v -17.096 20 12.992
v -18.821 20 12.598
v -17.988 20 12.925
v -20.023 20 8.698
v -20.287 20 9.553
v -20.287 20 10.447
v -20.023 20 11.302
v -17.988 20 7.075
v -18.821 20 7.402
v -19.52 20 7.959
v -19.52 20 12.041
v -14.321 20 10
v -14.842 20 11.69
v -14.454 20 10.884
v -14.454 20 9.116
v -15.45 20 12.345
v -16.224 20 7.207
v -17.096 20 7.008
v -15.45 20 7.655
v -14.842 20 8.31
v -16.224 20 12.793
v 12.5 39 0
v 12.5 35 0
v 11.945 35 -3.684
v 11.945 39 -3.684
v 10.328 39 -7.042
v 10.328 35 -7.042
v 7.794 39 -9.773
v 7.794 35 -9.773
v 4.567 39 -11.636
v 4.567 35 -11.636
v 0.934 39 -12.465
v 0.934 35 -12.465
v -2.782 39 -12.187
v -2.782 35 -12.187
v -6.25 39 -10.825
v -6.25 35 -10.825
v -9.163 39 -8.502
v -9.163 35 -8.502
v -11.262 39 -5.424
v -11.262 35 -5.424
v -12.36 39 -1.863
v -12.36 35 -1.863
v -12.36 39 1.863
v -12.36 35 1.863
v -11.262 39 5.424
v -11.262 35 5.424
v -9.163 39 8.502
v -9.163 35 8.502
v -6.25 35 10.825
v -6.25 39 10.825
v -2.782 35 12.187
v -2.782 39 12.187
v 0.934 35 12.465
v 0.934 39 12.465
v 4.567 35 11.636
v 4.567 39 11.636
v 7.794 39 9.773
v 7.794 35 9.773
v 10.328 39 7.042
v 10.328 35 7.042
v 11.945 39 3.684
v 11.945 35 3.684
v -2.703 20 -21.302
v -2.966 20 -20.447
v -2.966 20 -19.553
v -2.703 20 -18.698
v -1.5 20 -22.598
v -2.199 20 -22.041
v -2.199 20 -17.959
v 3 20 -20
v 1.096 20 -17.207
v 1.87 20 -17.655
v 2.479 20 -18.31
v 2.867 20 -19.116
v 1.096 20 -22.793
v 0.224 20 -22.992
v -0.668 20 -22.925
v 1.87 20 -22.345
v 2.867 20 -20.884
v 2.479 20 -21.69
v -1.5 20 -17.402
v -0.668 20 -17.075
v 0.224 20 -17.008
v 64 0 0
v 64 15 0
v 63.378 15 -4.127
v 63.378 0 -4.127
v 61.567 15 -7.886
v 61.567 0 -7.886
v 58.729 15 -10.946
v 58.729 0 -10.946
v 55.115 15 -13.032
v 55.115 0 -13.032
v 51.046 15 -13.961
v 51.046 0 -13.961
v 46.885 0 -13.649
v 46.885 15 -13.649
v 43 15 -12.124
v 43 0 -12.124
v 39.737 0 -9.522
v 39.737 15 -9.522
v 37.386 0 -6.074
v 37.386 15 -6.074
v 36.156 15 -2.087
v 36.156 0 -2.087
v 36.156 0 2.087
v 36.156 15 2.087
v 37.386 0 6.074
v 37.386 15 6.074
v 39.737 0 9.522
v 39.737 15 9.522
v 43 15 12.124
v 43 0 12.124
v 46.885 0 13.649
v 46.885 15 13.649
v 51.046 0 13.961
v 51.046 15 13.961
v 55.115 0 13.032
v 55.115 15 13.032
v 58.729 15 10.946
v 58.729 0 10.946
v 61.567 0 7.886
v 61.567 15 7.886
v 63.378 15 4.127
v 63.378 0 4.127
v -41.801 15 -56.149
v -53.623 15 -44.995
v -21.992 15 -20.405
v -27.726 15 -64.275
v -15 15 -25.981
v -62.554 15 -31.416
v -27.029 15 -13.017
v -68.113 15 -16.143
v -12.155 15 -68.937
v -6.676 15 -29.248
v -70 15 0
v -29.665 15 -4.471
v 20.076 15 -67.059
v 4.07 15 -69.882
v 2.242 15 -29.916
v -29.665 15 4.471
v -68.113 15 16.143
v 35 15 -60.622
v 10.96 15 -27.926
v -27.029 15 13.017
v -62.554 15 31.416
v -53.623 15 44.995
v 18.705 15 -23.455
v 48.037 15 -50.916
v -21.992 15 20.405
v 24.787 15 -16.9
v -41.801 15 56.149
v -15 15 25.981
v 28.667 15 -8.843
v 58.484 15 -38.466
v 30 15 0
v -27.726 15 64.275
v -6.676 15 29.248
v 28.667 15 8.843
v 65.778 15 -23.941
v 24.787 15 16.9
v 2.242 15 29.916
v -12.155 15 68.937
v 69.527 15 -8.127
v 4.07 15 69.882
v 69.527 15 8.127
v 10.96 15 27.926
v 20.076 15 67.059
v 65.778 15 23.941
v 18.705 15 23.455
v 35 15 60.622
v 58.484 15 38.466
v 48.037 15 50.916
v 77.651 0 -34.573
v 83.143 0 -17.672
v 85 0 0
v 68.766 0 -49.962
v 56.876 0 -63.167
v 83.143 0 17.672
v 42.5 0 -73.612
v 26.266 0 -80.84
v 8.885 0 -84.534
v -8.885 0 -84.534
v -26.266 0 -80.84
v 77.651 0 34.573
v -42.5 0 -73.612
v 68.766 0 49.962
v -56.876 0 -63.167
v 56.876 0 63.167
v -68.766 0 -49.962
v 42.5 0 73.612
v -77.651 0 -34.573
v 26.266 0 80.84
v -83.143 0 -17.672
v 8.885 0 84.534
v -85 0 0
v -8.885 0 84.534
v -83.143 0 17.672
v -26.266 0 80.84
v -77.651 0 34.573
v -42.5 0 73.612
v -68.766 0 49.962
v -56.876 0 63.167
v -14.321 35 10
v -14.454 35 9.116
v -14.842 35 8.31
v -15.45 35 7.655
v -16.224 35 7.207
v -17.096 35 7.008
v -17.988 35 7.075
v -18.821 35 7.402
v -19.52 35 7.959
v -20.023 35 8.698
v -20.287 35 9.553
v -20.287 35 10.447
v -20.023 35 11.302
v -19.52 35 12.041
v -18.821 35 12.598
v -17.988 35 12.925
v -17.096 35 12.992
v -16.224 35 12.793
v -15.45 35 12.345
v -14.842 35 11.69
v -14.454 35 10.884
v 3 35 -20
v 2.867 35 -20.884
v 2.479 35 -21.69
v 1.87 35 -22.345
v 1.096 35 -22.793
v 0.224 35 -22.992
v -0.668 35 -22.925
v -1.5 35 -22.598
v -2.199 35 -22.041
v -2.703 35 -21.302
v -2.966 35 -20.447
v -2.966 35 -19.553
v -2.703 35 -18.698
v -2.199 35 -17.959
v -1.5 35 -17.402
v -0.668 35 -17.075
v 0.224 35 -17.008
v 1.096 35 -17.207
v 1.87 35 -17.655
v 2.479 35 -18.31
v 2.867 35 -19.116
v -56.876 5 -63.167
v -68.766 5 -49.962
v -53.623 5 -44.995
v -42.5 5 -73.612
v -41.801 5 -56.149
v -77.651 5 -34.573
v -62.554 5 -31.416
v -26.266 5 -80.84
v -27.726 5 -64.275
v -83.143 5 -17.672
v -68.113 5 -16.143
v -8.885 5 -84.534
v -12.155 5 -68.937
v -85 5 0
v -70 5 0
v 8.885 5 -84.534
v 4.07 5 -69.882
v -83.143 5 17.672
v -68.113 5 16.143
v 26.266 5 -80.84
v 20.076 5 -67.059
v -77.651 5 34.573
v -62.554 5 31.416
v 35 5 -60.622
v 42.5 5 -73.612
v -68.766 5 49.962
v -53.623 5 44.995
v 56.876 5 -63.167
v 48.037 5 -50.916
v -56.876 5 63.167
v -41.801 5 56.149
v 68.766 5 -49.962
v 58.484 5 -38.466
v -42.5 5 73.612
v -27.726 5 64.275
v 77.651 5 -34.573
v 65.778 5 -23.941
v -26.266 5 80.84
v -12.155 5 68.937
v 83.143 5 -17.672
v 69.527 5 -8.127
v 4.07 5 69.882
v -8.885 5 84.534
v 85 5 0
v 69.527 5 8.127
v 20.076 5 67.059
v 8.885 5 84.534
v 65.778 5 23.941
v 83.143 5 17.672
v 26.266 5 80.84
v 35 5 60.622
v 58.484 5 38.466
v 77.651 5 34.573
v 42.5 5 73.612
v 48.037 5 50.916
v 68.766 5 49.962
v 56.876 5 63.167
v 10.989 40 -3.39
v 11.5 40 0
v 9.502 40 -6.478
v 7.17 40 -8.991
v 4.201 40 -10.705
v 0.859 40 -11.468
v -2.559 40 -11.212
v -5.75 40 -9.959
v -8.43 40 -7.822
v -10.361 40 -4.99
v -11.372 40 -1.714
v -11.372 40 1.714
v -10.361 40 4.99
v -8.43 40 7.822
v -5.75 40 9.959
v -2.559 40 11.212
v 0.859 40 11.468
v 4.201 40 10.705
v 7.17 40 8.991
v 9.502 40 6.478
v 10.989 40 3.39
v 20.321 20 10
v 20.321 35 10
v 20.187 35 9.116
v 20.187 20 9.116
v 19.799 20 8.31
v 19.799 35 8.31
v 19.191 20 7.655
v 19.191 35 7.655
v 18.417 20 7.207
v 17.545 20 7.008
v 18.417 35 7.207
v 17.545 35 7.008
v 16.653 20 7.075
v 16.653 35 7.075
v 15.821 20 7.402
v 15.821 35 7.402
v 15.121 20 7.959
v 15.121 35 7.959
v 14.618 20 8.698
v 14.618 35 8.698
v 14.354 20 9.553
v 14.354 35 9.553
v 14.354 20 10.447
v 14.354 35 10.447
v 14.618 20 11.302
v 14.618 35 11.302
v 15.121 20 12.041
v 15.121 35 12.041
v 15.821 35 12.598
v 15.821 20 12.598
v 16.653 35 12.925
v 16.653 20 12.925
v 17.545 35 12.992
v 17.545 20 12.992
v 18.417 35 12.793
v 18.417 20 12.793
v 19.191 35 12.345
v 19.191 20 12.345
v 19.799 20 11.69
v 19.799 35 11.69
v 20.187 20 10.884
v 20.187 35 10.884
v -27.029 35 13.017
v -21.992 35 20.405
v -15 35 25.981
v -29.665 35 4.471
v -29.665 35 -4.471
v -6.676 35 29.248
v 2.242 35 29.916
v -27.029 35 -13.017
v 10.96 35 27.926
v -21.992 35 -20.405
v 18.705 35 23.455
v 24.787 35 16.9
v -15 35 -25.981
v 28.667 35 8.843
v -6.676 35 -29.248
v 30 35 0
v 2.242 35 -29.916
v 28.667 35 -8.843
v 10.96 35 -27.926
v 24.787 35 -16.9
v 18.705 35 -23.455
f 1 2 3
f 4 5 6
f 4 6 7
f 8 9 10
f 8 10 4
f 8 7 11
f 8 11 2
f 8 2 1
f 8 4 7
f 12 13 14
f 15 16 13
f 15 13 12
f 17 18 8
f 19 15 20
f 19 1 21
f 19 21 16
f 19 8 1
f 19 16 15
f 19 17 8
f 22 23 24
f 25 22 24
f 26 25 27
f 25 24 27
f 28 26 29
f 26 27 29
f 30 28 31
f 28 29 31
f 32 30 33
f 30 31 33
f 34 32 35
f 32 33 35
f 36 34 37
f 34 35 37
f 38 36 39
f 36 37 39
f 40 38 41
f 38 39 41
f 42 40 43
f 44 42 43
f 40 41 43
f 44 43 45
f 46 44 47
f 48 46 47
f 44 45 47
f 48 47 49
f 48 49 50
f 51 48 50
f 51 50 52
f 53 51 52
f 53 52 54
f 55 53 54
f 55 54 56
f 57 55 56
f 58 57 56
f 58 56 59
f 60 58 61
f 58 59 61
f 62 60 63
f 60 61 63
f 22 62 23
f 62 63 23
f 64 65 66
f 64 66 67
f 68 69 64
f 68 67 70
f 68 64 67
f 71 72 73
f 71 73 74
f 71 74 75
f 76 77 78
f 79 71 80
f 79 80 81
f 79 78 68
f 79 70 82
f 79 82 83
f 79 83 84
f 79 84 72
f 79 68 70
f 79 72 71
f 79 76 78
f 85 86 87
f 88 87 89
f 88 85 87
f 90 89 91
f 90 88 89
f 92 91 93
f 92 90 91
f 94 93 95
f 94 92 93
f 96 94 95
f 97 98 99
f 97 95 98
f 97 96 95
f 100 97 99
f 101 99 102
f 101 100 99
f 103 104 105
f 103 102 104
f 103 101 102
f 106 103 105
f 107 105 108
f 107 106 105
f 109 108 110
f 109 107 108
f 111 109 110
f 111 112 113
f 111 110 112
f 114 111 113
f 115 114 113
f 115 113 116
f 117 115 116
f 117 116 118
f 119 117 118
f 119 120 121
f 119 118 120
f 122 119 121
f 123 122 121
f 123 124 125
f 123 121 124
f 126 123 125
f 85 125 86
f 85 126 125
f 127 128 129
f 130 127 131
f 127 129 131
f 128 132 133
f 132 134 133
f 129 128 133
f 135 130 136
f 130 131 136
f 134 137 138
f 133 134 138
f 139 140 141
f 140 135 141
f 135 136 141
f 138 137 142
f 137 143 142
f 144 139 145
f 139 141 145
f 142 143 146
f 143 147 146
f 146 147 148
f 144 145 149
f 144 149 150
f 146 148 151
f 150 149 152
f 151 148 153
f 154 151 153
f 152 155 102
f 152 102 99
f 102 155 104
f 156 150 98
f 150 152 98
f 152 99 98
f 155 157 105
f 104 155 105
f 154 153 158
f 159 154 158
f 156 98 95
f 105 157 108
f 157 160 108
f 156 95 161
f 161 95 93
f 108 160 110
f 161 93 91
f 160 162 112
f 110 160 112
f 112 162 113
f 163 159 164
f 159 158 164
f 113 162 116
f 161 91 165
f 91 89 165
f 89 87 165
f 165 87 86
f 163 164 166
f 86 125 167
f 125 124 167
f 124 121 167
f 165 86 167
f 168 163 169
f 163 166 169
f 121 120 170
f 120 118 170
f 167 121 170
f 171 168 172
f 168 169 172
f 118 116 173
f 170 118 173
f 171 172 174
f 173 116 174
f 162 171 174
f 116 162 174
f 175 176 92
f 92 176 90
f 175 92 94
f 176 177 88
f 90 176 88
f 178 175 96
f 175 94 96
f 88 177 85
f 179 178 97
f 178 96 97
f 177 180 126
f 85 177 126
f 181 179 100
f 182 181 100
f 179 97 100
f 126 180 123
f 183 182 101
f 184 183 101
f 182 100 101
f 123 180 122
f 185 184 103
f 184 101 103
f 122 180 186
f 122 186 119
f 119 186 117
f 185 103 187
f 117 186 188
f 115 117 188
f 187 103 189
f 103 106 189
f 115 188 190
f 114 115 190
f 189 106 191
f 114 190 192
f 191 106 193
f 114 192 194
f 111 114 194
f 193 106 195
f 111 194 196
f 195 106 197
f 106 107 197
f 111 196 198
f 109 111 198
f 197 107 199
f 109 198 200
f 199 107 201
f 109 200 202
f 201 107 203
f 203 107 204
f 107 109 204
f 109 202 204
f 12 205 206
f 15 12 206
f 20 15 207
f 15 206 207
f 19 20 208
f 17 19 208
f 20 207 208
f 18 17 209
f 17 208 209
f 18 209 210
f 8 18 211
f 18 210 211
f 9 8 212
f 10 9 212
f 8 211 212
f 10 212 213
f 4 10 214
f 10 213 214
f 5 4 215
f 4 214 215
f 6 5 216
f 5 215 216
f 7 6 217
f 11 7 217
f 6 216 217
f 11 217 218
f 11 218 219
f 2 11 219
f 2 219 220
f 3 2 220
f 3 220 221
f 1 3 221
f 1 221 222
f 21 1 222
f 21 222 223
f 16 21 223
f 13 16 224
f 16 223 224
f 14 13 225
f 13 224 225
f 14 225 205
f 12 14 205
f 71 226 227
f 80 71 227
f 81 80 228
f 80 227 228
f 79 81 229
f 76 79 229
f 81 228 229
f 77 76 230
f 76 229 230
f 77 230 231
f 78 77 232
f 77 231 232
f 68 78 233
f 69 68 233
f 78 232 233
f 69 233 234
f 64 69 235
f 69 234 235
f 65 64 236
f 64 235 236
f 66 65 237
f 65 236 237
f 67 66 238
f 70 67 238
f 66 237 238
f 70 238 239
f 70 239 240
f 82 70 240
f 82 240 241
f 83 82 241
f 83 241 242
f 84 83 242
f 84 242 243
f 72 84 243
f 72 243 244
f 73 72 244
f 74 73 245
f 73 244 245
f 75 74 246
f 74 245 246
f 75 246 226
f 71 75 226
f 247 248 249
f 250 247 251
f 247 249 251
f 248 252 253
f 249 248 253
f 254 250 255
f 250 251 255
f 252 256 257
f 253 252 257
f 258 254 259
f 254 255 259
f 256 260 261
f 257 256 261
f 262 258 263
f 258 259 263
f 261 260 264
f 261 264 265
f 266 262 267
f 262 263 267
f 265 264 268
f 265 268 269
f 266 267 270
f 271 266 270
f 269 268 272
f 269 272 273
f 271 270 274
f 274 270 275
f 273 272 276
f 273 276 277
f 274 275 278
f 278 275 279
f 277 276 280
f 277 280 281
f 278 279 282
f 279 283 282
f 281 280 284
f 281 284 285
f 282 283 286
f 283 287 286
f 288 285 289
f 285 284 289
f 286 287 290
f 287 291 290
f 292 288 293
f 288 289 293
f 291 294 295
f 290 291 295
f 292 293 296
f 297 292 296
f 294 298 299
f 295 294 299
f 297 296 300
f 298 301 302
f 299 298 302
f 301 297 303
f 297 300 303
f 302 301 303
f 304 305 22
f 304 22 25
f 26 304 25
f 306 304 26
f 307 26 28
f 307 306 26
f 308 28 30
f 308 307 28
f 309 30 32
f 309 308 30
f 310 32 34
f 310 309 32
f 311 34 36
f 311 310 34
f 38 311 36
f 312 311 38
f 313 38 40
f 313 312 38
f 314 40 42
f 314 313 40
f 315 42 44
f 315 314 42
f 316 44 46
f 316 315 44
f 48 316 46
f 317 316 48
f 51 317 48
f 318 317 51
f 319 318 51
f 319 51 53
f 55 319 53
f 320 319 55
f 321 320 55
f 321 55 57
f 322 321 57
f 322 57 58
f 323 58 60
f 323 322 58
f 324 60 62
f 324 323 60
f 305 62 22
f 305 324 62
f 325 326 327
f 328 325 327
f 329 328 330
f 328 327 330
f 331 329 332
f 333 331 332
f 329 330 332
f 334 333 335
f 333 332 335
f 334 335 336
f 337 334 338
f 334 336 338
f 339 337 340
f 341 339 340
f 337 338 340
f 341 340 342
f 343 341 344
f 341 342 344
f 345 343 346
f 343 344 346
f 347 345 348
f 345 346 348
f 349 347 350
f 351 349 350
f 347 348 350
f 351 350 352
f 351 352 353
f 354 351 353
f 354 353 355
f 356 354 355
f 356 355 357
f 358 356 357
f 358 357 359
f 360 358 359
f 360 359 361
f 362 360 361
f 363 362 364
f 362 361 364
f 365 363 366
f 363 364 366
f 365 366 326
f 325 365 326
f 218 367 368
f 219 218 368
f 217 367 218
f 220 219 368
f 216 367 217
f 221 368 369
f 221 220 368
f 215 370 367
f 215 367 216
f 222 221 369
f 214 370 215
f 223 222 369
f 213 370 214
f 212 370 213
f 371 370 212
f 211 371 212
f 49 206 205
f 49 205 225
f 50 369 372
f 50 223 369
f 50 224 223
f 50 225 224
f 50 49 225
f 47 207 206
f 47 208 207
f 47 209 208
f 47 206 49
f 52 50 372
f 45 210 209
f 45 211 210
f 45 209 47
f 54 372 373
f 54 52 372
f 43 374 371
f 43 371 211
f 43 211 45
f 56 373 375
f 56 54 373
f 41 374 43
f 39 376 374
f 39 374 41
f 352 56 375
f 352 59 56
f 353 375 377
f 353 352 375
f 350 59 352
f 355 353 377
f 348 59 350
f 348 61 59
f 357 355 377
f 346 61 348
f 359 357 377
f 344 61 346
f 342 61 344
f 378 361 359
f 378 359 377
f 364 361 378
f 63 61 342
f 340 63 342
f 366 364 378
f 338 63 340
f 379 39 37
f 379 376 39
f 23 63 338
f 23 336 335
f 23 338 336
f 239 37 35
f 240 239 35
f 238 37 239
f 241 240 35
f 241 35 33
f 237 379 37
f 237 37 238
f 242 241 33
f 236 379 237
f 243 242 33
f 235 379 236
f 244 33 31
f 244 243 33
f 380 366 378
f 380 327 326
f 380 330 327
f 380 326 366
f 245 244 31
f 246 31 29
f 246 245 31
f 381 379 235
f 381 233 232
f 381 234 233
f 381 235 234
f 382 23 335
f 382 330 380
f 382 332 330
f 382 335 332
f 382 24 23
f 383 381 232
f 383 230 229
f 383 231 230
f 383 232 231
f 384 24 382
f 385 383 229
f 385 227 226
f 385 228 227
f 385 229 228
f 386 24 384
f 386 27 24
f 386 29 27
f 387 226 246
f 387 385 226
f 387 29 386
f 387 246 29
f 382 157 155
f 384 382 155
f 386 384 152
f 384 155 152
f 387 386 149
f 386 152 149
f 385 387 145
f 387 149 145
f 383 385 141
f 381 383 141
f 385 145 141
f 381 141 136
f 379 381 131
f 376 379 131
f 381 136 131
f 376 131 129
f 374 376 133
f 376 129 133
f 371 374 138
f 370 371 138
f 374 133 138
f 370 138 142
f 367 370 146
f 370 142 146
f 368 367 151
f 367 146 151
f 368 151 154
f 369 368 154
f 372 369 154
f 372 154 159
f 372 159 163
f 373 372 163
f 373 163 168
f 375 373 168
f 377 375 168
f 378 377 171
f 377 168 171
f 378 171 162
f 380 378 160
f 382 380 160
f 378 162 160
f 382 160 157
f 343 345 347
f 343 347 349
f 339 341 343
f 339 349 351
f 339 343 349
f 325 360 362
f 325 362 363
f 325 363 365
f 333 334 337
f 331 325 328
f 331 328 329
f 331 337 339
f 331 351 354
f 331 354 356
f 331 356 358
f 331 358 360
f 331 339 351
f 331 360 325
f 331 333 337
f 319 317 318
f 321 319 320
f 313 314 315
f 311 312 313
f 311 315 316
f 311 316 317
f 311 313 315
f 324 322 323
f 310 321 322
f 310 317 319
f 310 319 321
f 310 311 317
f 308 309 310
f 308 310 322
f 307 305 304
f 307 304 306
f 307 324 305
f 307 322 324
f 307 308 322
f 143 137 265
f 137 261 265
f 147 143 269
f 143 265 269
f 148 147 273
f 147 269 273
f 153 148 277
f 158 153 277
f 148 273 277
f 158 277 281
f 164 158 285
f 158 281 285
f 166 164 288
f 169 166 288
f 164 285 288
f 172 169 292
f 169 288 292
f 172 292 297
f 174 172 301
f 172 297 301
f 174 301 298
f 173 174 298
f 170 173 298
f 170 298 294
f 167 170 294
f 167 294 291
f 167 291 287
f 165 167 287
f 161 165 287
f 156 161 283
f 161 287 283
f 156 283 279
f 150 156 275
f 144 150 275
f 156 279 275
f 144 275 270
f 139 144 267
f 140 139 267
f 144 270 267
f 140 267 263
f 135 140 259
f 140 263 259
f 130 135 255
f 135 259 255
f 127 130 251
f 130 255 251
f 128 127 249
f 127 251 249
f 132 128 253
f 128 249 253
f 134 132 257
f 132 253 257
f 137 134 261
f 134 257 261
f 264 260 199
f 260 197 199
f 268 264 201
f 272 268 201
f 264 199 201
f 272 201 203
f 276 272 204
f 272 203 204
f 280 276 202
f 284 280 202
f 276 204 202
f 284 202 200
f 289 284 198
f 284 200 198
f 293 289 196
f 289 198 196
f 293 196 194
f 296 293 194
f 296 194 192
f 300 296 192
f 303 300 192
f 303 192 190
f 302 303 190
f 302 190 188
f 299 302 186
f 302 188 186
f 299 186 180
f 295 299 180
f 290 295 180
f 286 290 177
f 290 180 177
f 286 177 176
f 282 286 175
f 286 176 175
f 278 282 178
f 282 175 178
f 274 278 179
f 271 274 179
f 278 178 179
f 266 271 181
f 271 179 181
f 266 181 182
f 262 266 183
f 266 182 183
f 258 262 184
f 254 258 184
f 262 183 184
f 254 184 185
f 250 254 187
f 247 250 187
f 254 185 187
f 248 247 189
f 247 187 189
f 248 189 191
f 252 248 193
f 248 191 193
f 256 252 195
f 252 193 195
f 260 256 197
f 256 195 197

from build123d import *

# Parameters (mm, degrees)
SKETCH_2_R          = 14
CUT_EXTRUDE_1_DEPTH = 20
SKETCH_3_R          = 30
EXTRUDE_1_DEPTH     = 20
SKETCH_4_R          = 12.5
EXTRUDE_2_DEPTH     = 5
CHAMFER_1_SIZE      = 1
SKETCH_5_R          = 3
CUT_EXTRUDE_2_DEPTH = 15


with BuildPart() as part:
    # 草图1 → 旋转1 (revolve)
    with BuildSketch(Plane.XY):
        Polygon((0, 0), (0, 15), (-70, 15), (-70, 5), (-85, 5), (-85, 0), align=None)
    revolve(axis=Axis((0, 0, 0), (0, 1, 0)))

    # 草图2 → 切除-拉伸1 (cut)
    with BuildSketch(Plane(origin=(0, 0, 0), x_dir=(1, 0, 0), z_dir=(0, 1, 0))):
        with Locations((50, 0)):
            Circle(SKETCH_2_R)
    extrude(amount=CUT_EXTRUDE_1_DEPTH, mode=Mode.SUBTRACT)

    # 草图3 → 凸台-拉伸1 (add)
    with BuildSketch(Plane(origin=(0, 15, 0), x_dir=(1, 0, 0), z_dir=(0, 1, 0))):
        Circle(SKETCH_3_R)
    extrude(amount=EXTRUDE_1_DEPTH)

    # 草图4 → 凸台-拉伸2 (add)
    with BuildSketch(Plane(origin=(0, 35, 0), x_dir=(1, 0, 0), z_dir=(0, 1, 0))):
        Circle(SKETCH_4_R)
    extrude(amount=EXTRUDE_2_DEPTH)

    # 倒角1
    chamfer_1_edges = [part.edges().sort_by_distance(p)[0] for p in [
        (-12.5, 40, 0),
    ]]
    chamfer(chamfer_1_edges, length=CHAMFER_1_SIZE)

    # 草图5 → 切除-拉伸2 (cut)
    with BuildSketch(Plane(origin=(0, 35, 0), x_dir=(1, 0, 0), z_dir=(0, 1, 0))):
        with Locations((0, 20)):
            Circle(SKETCH_5_R)
        with Locations((17.320508076, -10)):
            Circle(SKETCH_5_R)
        with Locations((-17.320508076, -10)):
            Circle(SKETCH_5_R)
    extrude(amount=-CUT_EXTRUDE_2_DEPTH, mode=Mode.SUBTRACT)


solid = part.part
